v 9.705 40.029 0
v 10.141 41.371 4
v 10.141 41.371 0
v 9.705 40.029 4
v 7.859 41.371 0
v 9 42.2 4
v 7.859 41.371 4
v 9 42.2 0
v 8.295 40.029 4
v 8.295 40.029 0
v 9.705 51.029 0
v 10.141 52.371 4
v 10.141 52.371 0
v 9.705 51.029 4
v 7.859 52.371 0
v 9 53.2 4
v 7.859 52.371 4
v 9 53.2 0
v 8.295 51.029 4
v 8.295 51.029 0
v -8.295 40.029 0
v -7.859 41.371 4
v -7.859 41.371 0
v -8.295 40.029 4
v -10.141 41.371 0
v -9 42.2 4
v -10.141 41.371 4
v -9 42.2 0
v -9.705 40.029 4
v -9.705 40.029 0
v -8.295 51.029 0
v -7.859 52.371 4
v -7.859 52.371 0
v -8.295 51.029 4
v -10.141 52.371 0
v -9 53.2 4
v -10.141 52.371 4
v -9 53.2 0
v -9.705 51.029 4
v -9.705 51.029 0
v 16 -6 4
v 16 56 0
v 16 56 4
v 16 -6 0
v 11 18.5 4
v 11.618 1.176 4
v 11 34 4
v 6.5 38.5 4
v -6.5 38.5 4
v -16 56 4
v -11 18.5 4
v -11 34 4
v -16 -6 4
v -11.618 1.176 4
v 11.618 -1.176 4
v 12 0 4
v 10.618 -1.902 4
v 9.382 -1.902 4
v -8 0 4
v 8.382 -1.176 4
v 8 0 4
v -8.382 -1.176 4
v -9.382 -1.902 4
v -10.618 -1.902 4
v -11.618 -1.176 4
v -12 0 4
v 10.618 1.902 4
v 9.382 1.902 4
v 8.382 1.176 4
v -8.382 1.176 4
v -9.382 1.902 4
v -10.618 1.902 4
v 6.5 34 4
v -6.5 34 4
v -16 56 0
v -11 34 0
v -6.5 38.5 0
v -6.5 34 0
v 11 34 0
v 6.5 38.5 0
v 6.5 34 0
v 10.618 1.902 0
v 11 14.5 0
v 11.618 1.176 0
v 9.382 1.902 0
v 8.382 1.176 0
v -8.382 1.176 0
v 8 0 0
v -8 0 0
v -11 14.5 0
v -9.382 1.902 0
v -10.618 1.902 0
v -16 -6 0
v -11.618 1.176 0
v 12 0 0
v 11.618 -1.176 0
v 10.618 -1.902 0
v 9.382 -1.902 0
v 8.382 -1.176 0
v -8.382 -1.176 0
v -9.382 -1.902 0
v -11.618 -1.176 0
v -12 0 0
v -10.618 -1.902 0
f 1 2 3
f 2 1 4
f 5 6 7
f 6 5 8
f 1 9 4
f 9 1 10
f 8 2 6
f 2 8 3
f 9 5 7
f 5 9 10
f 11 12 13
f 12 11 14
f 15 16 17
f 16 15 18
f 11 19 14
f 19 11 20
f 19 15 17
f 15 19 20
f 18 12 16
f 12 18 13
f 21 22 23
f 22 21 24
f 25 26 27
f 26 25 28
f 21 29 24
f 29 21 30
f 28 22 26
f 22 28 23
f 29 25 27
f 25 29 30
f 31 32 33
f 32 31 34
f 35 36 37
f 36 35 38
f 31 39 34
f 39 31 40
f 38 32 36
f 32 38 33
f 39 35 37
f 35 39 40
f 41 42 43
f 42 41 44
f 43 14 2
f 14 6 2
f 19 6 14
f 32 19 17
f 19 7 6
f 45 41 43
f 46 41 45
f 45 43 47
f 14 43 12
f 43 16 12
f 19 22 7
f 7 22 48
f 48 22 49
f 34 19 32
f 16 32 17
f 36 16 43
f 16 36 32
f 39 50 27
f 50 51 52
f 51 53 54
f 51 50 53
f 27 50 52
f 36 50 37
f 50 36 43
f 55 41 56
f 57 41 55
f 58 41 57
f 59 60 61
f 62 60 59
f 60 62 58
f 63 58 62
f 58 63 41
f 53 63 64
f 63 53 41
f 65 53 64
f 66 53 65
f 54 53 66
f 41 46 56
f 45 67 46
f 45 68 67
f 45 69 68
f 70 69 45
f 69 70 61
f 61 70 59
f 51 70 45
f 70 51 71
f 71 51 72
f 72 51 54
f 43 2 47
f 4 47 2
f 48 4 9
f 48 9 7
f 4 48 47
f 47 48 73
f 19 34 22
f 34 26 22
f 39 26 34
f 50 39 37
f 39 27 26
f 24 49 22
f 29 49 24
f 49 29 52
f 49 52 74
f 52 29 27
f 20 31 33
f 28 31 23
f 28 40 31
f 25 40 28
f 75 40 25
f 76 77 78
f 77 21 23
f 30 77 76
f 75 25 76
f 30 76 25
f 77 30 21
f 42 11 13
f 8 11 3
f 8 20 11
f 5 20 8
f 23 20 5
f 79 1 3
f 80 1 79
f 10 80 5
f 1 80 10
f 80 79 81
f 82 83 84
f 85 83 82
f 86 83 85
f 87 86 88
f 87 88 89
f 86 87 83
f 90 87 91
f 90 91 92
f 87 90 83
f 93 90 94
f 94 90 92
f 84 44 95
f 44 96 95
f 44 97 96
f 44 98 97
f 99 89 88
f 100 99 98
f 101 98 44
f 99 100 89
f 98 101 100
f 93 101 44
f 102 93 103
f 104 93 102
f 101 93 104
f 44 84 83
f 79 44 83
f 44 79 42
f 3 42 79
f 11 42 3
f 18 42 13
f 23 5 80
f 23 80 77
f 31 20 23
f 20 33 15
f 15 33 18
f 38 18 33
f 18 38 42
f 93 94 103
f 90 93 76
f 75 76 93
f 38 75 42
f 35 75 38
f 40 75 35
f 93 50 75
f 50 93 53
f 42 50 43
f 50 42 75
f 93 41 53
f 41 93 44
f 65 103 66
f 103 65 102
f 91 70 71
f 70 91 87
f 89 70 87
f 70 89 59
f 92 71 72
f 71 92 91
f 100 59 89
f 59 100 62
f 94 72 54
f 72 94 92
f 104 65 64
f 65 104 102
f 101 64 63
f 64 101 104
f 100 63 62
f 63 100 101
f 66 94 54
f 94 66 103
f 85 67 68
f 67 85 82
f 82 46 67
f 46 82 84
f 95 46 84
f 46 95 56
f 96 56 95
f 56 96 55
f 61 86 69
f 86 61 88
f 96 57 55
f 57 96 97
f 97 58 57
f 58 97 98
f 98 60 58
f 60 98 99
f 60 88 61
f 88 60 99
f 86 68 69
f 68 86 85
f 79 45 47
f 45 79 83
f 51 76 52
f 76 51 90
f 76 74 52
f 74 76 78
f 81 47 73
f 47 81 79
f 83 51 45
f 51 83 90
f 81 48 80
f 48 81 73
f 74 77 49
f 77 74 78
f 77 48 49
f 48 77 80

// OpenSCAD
// file: utils.scad
// Author: Mihai Oltean, https://mihaioltean.github.io, mihai.oltean@gmail.com
// More details: https://jenny5.org, https://jenny5-robot.github.io/
// Source code: github.com/jenny5-robot
// MIT License
//--------------------------------------------------------------

module colt(radius, height)
{
	difference(){
		cube ([radius, radius, height]);
		cylinder	(h = height, r = radius, $fn = 30);
	}
}
/////////////////////////////////////////////////////////////////////////////////////////////////////////////////////////
module colt_sferic(radius)
{
	difference(){
		cube ([radius, radius, radius]);
		sphere(r = radius, $fn = 40);
	}
}
/////////////////////////////////////////////////////////////////////////////////////////////////////////////////////////
module coloana_sferica(height, radius)
{
		difference(){
			cube ([height, height, height]);
			cylinder(h= height, r = radius, $fn = 50);
		}
}
/////////////////////////////////////////////////////////////////////////////////////////////////////////////////////////
// file: as5147_params.scad
// Author: Mihai Oltean, https://mihaioltean.github.io, mihai.oltean@gmail.com
// More details: https://jenny5.org, https://jenny5-robot.github.io/
// Source code: github.com/jenny5-robot
// MIT License
//--------------------------------------------------------------

as5147_board_size = [28.5, 22, 2];

as5147_space_between_holes_length = 11;
as5147_space_between_holes_width = 18;
as5147_distance_hole_from_margin = 2;

as5147_holes_position = [
[as5147_distance_hole_from_margin, as5147_distance_hole_from_margin, 0],
[as5147_distance_hole_from_margin + as5147_space_between_holes_length, as5147_distance_hole_from_margin, 0],
[as5147_distance_hole_from_margin, as5147_distance_hole_from_margin + as5147_space_between_holes_width, 0],
[as5147_distance_hole_from_margin + as5147_space_between_holes_length, as5147_distance_hole_from_margin + as5147_space_between_holes_width, 0],
];

as5147_holes_position_relative = [
[as5147_space_between_holes_length / 2, as5147_space_between_holes_width / 2, 0],
[as5147_space_between_holes_length / 2, -as5147_space_between_holes_width / 2, 0],
[-as5147_space_between_holes_length / 2, as5147_space_between_holes_width / 2, 0],
[-as5147_space_between_holes_length / 2, -as5147_space_between_holes_width / 2, 0]
];

as5147_pin_area_length = 7.5;
as5147_voltage_selector_pins_length = 13;
as5147_voltage_selector_pins_position = 15.5;

as5147_sensor_center = [as5147_distance_hole_from_margin + as5147_space_between_holes_length / 2, as5147_space_between_holes_length + as5147_space_between_holes_width / 2];
// file: tolerance.scad
// Author: Mihai Oltean, https://mihaioltean.github.io, mihai.oltean@gmail.com
// More details: https://jenny5.org, https://jenny5-robot.github.io/
// Source code: github.com/jenny5-robot
// MIT License
//--------------------------------------------------------------

tolerance = 0.1;
display_tolerance = 1;

overlap_tolerance = 0.01;

tolerance_z = [0, 0, tolerance];
tolerance_x = [tolerance, 0, 0];
tolerance_y = [0, tolerance, 0];

display_tolerance_z = [0, 0, display_tolerance];
display_tolerance_x = [display_tolerance, 0, 0];
display_tolerance_y = [0, display_tolerance, 0];

display_tolerance_xz = [display_tolerance, 0, display_tolerance];
display_tolerance_xy = [display_tolerance, display_tolerance, 0];
display_tolerance_yz = [0, display_tolerance, display_tolerance];

display_tolerance_xyz = [display_tolerance, display_tolerance, display_tolerance];
// file: config.scad
// Author: Mihai Oltean, https://mihaioltean.github.io, mihai.oltean@gmail.com
// More details: https://jenny5.org, https://jenny5-robot.github.io/
// Source code: github.com/jenny5-robot
// MIT License
//--------------------------------------------------------------

aluminium_color = "Silver";
screw_color = "LightSlateGray";
frame_color = aluminium_color;
shaft_color = "Silver";
plastic_color = "Yellow";
pulley_color = "DarkSlateGray";
steel_color = "LightSlateGray";
// file: params_screws_nuts_washers.scad
// Author: Mihai Oltean, https://mihaioltean.github.io, mihai.oltean@gmail.com
// More details: https://jenny5.org, https://jenny5-robot.github.io/
// Source code: github.com/jenny5-robot
// MIT License
//--------------------------------------------------------------


m2_screw_radius = 1;
m2_nut_radius = 2.2;
m2_nut_height = 1.6;
m2_nut_thick = m2_nut_height;

m3_screw_radius = 1.5;
m3_nut_radius = 3.1;
m3_nut_height = 2.3;
m3_nut_thick = m3_nut_height;
m3_autolock_nut_thick = 4.2;

m4_screw_radius = 2;
m4_nut_radius = 4;
m4_auto_lock_nut_height = 5;
m4_nut_height = 3.25;
m4_nut_thick = 3.25;

m5_screw_radius = 2.5;
m5_nut_radius = 4.6;
m5_nut_height = 4;

m6_screw_radius = 3;
m6_nut_radius = 5.65;
m6_nut_thick = 5;
m6_nut_slim_thick = 3;
m6_autolock_nut_thick = 6;
m6_long_nut_thick = 9;

m8_screw_head_height = 5.7;
m8_screw_radius = 3.9;
m8_nut_small_width = 12.8;
m8_nut_radius = 7.3;
m8_slim_nut_small_width = 12.4;
m8_nut_thick = 6.5;
m8_nut_height = m8_nut_thick;
m8_slim_nut_height = 5.5;
m8_screw_head_radius = 6.5;
m8_autolock_nut_thick = 8;

m10_screw_radius = 5;
m10_nut_thick = 8;
m10_nut_radius = 9.8;

M12_screw_radius = 6;
M12_nut_thick = 10;
M12_nut_radius = 11;
M12_long_long_nut_thick = 36;
M12_long_nut_thick = 36;
M12_autolock_nut_thick = 14;

m10_long_nut_radius = 9.71;
m10_long_nut_height = 29.8;

m10_long_thick_nut_radius = 7.41;
m10_long_thick_nut_height = 30.4;

m12_plastic_nut_radius = 10.45;
m12_plastic_nut_height = 23.3;

tr12_3_nut_radius = 11;
tr12_3_nut_height = 18.1;

washer_5 = 0.97;

washer_4_12_radius = 6;
washer_4_12_external_radius = 6;
washer_4_12_thick = 1;
washer_4_thick = 1;
washer_4_12_internal_radius = 2.15;

washer_4_9_external_radius = 4.5;
washer_4_9_internal_radius = 2.15;
washer_4_9_thick = 1;

washer_6_thick = 1.7;
washer_8_thick = 1.5;

washer_10_height = 2;
washer_10_thick = 2;

washer_12_thick = 2;

washer_5_15_external_radius = 7.5;
washer_5_15_thick = 1;
washer_5_thick = 1;
washer_5_15_internal_radius = 2.65;
// file: params_basic_components.scad
// Author: Mihai Oltean, https://mihaioltean.github.io, mihai.oltean@gmail.com
// More details: https://jenny5.org, https://jenny5-robot.github.io/
// Source code: github.com/jenny5-robot
// MIT License
//--------------------------------------------------------------

spring_length = 20;

smooth_rod_8_radius = 4;
smooth_rod_10_radius = 5;
smooth_rod_12_radius = 6;

wall_thick_1 = 1;
wall_thick_2 = 2;
wall_thick_3 = 3;
wall_thick_4 = 4;
wall_thick_5 = 5;
wall_thick_5_5 = 5.5;
wall_thick_6 = 6;
wall_thick_7 = 7;
wall_thick_8 = 8;
wall_thick_9 = 9;
wall_thick_10 = 10;
wall_thick_12 = 12;
// main file
// Author: Mihai Oltean, https://mihaioltean.github.io, mihai.oltean@gmail.com
// More details: http://jenny5.org, https://jenny5-robot.github.io/
// Source code: github.com/jenny5-robot
// MIT License
//--------------------------------------------------------------

include <params_basic_components.scad>
use <basic_components.scad>

include <params_screws_nuts_washers.scad>

include <config.scad>

include <tolerance.scad>

include <as5147_params.scad>


//--------------------------------------------------------------
module as5147_sensor_support(distance_between_screws, width = 60)
{
    
    echo(distance_between_screws = distance_between_screws);
    length = distance_between_screws + 2 * m4_nut_radius + 2 * wall_thick_2;
    height = 4;
    screw_holder_size = 12;
    
    difference(){
        color(plastic_color)
        union(){
            translate ([- length / 2, -screw_holder_size / 2, 0]) cube([length, width + 2, height]);
        }
// first screw for connecting to the next part
        translate ([-distance_between_screws / 2, 0, 0] - display_tolerance_z) cylinder(h = height + 2 * display_tolerance, r = 2, $fn = 10);
// second screw hole
        translate ([distance_between_screws / 2, 0, 0] - display_tolerance_z) cylinder(h = height + 2 * display_tolerance, r = 2, $fn = 10);
        
        // sensor screw holes
        for (i = [0: 3])
             translate ([0, width - screw_holder_size / 2 - as5147_space_between_holes_length / 2 - as5147_distance_hole_from_margin, 0]) rotate ([0, 0, 90]) translate ([-as5147_distance_hole_from_margin - as5147_space_between_holes_length / 2, -as5147_distance_hole_from_margin - as5147_space_between_holes_width / 2, 0] + as5147_holes_position[i] - display_tolerance_z) cylinder (h = height + 2 * display_tolerance, r = 1.2);
        
        // sensor connector holes
        translate ([-as5147_board_size[1] / 2, width - screw_holder_size / 2 - as5147_board_size[0] - 6, 0] - display_tolerance_z)  cube ([as5147_board_size[1], as5147_pin_area_length + 7, height] + 2 * display_tolerance_z);
        
        // slope
        translate ([-as5147_board_size[1] / 2, width - screw_holder_size / 2 - as5147_board_size[0] - 6 - 6, 0] - display_tolerance_z)  rotate ([-45, 0, 0]) cube ([as5147_board_size[1], height + 2, height + 2] + 2 * display_tolerance_z);

    // sensor voltage select pins hole
        translate ([-as5147_voltage_selector_pins_length / 2, width - screw_holder_size / 2 - as5147_voltage_selector_pins_position - 2.54 - 1 - 1, 0] - display_tolerance_z) cube ([as5147_voltage_selector_pins_length, 2.54 + 2, height] + 2 * display_tolerance_z);        
    }
}
//---------------------------------------------------------------------------

as5147_sensor_support(20, 60);
